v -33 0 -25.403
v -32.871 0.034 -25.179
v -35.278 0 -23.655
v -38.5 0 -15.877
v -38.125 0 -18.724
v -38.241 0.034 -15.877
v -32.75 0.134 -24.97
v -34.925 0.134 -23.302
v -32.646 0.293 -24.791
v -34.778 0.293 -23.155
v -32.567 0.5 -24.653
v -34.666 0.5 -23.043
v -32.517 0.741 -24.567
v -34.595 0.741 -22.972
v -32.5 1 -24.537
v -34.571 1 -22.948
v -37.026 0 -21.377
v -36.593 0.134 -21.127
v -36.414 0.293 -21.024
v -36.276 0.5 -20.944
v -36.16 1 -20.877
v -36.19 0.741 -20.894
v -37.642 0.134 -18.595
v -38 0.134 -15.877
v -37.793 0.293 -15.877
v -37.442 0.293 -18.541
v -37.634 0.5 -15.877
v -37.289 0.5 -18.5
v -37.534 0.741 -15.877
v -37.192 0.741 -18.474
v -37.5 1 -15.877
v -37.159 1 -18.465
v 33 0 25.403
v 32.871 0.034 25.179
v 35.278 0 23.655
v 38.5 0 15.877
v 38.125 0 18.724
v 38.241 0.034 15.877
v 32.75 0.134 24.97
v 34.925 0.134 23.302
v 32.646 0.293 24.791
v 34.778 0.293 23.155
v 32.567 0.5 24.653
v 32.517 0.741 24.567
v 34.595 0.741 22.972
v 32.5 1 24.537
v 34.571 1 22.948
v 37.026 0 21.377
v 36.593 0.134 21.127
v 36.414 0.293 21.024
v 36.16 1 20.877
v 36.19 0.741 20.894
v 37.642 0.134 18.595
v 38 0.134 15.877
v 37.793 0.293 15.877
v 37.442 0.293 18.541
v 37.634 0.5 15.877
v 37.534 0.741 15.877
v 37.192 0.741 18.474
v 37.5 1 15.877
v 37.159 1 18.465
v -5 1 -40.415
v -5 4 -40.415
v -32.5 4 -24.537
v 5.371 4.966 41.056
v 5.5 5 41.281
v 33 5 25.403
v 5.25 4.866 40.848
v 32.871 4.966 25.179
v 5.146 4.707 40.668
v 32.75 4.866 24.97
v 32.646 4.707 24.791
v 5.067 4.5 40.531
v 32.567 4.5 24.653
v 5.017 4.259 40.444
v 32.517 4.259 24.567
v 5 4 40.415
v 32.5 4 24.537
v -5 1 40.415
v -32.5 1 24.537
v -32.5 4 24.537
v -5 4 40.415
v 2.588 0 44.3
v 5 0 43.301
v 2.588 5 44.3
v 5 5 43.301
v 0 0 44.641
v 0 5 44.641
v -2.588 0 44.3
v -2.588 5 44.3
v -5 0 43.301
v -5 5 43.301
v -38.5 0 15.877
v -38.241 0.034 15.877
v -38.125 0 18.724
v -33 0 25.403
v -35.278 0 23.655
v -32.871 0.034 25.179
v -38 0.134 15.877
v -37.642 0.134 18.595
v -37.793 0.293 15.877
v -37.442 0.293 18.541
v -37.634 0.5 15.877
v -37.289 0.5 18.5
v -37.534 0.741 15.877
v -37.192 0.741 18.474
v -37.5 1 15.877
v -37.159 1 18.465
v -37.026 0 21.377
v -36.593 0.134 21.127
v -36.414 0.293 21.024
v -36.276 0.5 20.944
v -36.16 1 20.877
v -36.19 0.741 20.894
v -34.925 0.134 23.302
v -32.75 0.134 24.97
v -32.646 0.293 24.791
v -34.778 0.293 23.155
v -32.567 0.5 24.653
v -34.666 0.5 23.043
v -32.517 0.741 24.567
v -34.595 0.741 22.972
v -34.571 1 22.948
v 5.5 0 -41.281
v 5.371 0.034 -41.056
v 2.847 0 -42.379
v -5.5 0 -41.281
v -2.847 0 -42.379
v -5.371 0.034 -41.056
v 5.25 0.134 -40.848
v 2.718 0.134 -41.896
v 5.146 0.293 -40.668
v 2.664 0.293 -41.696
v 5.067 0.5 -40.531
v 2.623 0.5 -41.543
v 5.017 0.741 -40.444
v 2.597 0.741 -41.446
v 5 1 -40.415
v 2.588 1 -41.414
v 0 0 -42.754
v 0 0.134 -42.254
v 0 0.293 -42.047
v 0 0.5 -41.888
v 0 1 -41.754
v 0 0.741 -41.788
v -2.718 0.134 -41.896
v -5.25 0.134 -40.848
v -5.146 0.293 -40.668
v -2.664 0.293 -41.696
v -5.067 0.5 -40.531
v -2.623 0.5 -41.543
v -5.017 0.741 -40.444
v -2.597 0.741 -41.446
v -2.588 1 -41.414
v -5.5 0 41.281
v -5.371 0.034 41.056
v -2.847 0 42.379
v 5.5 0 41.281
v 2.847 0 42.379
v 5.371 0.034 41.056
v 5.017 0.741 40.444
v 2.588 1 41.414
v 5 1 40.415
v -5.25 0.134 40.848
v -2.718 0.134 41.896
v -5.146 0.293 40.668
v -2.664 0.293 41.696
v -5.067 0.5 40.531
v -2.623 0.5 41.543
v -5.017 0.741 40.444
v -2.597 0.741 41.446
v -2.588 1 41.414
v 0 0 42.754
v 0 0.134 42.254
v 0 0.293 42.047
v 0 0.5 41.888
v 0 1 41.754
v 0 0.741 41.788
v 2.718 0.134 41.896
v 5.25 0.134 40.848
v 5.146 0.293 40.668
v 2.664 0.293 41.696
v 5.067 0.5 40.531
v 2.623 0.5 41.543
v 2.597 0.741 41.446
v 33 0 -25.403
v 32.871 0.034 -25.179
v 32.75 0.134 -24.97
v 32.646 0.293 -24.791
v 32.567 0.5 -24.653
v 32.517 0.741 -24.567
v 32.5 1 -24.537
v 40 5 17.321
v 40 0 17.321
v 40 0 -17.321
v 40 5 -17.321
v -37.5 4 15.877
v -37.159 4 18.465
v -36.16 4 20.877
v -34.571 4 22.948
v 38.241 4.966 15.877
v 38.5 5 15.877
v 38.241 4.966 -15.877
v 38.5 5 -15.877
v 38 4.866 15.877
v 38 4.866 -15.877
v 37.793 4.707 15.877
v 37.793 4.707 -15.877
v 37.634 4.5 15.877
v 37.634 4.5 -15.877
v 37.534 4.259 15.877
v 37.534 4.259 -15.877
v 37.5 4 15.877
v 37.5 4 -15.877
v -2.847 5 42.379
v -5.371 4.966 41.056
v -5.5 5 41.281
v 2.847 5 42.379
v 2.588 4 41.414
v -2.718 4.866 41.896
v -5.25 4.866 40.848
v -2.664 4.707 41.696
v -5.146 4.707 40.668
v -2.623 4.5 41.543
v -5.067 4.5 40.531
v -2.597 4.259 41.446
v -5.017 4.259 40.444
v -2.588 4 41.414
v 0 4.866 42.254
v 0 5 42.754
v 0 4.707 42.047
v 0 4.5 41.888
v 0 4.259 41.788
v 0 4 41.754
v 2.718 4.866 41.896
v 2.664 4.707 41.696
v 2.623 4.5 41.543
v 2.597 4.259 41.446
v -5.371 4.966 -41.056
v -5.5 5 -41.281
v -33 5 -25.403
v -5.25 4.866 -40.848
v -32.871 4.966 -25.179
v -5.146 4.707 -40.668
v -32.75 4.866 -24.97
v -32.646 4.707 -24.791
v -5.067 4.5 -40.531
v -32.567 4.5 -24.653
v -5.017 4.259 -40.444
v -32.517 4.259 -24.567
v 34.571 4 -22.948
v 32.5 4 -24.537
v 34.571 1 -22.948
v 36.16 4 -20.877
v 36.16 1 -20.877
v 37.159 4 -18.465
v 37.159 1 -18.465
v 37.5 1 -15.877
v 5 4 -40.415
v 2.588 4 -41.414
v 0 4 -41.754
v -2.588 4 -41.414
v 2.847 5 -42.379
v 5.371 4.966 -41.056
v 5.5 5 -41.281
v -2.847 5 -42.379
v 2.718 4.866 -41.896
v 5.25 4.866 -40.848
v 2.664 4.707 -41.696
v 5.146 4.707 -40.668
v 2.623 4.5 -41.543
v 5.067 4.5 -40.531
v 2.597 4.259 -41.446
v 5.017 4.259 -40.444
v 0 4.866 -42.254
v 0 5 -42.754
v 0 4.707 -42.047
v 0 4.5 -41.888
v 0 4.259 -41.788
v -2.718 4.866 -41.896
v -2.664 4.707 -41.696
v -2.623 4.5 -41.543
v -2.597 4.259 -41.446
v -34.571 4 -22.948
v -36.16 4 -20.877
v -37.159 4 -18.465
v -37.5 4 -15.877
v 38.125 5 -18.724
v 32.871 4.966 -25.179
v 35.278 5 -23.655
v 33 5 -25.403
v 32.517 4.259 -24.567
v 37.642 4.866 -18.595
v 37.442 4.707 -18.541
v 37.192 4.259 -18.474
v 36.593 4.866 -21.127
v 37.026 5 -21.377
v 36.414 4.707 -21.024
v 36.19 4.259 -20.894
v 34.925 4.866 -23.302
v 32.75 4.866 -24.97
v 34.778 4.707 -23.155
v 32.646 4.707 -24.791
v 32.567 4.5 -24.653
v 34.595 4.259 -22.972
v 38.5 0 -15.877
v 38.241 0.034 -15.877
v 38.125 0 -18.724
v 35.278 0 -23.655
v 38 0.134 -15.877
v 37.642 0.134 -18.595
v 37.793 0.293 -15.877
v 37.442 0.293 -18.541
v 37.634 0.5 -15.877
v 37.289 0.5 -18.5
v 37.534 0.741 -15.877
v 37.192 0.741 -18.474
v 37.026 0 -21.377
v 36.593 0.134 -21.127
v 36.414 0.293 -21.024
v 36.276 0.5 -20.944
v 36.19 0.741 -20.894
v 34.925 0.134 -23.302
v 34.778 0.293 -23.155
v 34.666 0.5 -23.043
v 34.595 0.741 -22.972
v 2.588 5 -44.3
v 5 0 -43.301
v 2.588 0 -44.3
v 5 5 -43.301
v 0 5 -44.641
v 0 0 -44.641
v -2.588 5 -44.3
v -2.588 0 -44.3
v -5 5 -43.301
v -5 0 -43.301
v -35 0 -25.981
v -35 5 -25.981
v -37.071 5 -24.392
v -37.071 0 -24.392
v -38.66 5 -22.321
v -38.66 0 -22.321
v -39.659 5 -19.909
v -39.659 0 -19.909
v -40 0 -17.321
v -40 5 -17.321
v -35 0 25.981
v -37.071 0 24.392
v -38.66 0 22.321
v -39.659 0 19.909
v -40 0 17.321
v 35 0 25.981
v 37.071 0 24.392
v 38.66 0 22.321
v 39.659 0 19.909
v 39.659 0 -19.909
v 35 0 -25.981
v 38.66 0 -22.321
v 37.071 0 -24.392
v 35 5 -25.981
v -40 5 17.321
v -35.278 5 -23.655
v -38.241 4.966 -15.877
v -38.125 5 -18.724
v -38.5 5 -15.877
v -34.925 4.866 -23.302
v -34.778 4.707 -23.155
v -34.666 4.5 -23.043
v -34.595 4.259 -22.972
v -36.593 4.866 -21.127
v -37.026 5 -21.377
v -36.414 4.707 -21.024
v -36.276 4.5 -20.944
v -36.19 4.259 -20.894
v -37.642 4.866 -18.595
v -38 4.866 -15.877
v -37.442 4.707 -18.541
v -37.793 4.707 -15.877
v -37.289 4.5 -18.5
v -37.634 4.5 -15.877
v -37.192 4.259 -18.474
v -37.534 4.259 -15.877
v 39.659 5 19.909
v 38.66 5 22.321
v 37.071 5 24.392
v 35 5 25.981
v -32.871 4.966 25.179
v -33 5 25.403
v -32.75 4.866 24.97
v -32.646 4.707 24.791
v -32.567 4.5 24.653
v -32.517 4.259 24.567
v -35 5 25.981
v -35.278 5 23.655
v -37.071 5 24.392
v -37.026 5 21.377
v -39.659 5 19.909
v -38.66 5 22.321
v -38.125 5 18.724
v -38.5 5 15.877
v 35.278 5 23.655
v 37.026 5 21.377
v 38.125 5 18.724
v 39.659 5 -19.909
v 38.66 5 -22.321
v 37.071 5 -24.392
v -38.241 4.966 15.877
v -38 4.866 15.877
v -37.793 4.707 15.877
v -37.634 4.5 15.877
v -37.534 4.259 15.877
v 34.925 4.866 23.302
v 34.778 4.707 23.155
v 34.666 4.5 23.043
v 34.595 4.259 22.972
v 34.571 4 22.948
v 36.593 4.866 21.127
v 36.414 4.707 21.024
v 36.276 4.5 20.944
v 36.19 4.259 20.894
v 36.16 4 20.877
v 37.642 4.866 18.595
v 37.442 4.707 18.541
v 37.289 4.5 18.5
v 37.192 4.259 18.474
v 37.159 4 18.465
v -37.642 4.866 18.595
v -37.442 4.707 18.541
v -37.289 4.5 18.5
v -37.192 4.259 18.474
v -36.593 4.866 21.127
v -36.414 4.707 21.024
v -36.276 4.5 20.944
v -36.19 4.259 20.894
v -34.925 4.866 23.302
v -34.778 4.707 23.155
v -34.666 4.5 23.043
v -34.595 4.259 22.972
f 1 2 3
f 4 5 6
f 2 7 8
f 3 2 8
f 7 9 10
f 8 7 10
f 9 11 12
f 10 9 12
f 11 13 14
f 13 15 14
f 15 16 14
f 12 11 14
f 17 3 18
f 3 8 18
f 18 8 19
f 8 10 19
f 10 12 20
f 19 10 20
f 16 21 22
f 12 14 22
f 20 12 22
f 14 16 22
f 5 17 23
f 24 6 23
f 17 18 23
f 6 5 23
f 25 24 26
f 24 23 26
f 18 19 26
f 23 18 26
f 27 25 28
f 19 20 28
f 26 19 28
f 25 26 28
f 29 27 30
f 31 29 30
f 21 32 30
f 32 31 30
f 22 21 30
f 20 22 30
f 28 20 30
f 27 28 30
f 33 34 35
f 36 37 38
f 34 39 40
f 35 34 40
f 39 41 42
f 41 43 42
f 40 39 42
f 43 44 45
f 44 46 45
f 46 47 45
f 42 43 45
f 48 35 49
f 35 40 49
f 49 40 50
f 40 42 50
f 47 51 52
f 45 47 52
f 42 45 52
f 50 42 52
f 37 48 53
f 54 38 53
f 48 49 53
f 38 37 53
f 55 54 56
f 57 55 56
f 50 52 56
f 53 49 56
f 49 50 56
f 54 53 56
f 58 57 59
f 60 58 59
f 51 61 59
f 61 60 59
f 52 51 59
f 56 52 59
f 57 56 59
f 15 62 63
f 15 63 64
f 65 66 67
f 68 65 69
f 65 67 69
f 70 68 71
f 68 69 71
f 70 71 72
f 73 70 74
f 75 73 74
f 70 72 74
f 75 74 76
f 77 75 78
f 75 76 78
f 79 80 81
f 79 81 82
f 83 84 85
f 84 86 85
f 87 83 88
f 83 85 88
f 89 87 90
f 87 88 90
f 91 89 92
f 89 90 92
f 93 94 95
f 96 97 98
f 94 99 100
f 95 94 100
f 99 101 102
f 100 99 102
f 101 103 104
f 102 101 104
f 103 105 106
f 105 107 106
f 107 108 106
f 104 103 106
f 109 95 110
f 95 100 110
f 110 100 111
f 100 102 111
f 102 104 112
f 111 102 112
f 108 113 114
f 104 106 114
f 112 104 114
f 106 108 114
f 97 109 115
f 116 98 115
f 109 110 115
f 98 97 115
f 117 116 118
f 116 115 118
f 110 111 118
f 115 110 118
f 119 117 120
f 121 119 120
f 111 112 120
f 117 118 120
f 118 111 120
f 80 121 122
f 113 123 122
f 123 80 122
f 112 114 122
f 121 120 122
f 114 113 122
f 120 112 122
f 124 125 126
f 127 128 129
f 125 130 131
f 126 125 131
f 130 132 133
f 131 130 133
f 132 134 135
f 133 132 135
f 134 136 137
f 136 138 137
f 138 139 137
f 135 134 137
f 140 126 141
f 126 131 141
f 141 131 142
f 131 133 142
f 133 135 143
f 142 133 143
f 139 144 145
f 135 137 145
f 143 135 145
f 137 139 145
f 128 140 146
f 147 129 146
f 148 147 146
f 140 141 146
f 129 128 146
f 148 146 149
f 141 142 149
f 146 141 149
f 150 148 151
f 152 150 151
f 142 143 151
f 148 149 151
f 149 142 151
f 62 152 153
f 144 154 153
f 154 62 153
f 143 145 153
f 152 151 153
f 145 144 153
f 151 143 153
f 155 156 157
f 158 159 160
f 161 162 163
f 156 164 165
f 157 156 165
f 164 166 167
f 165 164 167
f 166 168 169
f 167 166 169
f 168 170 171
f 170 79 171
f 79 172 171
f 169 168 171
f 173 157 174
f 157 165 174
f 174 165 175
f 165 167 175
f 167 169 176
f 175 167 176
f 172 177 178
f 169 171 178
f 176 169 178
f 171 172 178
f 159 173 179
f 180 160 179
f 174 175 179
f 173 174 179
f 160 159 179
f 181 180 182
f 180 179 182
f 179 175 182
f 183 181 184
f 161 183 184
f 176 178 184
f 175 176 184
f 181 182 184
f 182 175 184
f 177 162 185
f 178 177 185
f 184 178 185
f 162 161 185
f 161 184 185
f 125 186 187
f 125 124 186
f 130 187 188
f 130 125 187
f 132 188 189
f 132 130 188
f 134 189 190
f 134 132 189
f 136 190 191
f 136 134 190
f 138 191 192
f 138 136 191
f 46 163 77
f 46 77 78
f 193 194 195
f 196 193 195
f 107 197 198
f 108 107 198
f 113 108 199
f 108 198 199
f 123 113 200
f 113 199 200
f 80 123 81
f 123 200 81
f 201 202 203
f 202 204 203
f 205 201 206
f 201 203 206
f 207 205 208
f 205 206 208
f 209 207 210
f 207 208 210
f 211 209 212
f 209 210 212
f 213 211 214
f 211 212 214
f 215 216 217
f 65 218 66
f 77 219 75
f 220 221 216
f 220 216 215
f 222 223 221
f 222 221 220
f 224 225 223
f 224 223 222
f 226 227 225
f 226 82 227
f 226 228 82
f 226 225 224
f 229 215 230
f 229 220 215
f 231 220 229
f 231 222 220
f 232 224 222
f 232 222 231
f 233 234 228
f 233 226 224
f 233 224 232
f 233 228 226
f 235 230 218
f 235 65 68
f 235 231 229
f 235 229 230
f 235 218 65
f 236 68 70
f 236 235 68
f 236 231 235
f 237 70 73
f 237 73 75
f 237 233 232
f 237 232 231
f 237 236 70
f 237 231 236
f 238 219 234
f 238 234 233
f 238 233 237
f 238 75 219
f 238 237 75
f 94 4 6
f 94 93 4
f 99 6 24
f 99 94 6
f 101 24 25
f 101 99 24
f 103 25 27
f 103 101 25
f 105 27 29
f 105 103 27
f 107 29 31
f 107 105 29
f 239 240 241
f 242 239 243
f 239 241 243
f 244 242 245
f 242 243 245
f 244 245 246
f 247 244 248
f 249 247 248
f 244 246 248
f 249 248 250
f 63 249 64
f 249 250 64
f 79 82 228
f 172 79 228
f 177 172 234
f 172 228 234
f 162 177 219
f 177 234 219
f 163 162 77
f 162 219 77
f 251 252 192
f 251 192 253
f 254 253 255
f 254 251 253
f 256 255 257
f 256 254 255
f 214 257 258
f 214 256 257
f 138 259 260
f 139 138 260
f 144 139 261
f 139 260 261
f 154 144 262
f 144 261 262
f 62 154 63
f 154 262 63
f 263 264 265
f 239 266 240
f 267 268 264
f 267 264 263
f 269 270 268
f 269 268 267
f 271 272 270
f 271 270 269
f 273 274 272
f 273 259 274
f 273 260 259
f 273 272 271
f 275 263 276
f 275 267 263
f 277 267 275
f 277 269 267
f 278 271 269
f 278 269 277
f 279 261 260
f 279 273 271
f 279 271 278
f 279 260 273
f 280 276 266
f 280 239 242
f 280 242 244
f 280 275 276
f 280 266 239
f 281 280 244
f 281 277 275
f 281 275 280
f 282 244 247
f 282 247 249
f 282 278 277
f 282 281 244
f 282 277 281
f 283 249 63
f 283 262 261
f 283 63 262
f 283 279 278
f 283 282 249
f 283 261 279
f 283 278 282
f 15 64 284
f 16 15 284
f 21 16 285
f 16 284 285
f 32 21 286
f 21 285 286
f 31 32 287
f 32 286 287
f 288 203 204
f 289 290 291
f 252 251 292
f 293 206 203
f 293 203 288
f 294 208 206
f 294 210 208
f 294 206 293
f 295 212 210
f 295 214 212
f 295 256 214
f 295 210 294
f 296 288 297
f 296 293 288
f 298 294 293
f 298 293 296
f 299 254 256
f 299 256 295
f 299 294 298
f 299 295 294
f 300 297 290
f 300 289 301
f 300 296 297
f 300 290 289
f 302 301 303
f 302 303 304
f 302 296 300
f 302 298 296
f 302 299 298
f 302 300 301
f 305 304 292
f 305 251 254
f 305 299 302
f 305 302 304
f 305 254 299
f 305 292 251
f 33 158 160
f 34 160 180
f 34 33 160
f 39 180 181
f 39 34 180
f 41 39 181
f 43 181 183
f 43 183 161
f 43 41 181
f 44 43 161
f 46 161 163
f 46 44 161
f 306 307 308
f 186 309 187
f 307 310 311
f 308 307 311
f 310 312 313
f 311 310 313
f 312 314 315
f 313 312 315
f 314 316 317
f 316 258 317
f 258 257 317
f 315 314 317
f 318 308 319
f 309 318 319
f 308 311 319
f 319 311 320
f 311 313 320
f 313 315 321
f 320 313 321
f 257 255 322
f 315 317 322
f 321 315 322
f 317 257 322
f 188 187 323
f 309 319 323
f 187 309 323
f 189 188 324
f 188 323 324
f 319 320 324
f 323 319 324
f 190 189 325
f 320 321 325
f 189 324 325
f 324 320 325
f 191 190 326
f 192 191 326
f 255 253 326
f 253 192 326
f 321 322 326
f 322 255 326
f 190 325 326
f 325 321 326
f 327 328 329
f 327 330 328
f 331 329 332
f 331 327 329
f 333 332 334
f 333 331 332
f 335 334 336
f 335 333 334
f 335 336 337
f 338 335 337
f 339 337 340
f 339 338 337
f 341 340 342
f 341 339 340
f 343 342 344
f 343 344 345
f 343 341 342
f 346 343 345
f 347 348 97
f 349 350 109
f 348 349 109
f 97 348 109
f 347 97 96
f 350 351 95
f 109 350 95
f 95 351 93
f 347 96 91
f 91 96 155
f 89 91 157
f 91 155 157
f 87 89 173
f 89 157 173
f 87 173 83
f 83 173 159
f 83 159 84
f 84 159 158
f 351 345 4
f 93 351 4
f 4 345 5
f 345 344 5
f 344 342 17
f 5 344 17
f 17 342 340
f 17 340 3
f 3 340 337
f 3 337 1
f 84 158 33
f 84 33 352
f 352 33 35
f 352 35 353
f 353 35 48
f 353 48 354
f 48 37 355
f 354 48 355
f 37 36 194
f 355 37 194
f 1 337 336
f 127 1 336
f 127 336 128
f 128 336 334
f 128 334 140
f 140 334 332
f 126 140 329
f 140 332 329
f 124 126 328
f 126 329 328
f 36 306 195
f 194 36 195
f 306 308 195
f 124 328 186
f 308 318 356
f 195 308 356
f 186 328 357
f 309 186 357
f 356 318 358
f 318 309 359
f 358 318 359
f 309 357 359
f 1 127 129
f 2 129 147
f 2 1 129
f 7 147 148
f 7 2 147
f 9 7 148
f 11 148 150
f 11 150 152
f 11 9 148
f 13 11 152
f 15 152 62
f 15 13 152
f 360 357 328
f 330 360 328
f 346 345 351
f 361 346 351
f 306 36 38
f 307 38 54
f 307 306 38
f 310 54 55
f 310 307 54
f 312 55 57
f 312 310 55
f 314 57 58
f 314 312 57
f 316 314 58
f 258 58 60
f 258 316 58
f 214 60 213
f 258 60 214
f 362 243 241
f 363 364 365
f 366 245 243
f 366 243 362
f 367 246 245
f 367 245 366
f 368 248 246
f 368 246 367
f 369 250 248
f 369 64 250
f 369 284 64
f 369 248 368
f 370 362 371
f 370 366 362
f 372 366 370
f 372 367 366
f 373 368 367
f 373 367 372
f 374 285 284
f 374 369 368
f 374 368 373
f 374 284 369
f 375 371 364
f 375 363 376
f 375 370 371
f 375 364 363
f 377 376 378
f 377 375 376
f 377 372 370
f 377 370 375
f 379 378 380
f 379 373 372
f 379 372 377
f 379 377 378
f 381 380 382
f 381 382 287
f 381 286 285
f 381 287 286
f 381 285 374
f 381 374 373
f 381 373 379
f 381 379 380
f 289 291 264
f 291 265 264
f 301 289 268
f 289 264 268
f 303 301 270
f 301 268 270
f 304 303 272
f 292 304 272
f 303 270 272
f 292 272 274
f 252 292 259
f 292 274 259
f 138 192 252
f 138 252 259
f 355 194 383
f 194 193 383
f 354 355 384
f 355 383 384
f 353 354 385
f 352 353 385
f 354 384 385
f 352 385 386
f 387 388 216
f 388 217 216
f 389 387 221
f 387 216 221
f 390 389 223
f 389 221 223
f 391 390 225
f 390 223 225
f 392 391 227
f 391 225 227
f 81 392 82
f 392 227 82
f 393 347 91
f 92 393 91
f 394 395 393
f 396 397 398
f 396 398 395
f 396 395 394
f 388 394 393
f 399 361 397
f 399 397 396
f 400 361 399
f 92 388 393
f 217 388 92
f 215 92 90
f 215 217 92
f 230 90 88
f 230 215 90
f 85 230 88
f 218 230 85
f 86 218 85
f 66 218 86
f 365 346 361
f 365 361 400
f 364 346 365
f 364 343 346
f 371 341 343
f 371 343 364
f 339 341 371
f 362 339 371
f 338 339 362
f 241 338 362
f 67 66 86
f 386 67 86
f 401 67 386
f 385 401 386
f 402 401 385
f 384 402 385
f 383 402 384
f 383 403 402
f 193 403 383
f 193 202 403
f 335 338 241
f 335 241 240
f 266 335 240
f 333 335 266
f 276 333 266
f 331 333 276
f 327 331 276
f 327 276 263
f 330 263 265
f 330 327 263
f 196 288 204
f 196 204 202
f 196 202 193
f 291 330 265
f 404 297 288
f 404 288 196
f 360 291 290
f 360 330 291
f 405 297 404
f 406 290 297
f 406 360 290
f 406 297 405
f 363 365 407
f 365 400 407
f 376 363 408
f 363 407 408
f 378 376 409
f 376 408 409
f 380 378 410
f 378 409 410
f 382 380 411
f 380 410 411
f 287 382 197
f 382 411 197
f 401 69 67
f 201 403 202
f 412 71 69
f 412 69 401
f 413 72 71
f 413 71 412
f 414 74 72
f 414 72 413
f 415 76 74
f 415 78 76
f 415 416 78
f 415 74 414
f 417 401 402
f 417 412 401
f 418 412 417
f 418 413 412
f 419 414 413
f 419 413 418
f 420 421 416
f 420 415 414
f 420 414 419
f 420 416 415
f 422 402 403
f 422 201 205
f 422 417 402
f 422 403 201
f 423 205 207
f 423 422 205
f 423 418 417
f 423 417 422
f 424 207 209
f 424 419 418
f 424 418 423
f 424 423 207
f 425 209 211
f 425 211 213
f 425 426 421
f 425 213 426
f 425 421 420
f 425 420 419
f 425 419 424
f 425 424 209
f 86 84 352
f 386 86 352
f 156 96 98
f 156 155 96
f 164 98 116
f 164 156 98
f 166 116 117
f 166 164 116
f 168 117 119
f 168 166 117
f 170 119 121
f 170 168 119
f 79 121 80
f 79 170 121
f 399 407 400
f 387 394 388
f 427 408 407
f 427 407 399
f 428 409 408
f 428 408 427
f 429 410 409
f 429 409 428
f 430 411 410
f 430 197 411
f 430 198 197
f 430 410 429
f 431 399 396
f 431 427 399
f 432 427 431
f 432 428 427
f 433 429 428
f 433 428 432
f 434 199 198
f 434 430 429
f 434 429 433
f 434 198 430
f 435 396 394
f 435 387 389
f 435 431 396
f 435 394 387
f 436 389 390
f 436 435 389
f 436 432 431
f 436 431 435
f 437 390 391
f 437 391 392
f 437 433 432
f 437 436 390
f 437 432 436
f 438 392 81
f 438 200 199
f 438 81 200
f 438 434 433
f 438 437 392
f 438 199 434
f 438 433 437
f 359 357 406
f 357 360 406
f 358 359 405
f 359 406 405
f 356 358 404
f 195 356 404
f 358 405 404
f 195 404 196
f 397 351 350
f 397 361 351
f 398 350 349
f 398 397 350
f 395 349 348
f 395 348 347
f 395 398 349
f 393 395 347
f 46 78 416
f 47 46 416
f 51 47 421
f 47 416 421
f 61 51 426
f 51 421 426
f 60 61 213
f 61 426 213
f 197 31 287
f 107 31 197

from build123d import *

# Parameters (mm, degrees)
ESTRUSIONE_SOTTILE1_DEPTH = 5
RACCORDO1_R               = 10
RACCORDO2_R               = 1


with BuildPart() as part:
    # Schizzo2 → Estrusione-Sottile1 (new body)
    with BuildSketch(Plane(origin=(0, 0, 0), x_dir=(1, 0, 0), z_dir=(0, 1, 0))):
        Polygon((40, 23.094010768), (0, 46.188021535), (-40, 23.094010768), (-40, -23.094010768), (0, -46.188021535), (40, -23.094010768), align=None)
        Polygon((37.5, 21.650635095), (0, 43.301270189), (-37.5, 21.650635095), (-37.5, -21.650635095), (0, -43.301270189), (37.5, -21.650635095), align=None, mode=Mode.SUBTRACT)
    extrude(amount=ESTRUSIONE_SOTTILE1_DEPTH)

    # Raccordo1
    raccordo1_edges = [part.edges().sort_by_distance(p)[0] for p in [
        (37.5, 2.5, 21.650635095),
        (37.5, 2.5, -21.650635095),
        (0, 2.5, -43.301270189),
        (-37.5, 2.5, -21.650635095),
        (-37.5, 2.5, 21.650635095),
        (0, 2.5, 43.301270189),
        (40, 2.5, 23.094010768),
        (0, 2.5, 46.188021535),
        (-40, 2.5, 23.094010768),
        (-40, 2.5, -23.094010768),
        (0, 2.5, -46.188021535),
        (40, 2.5, -23.094010768),
    ]]
    fillet(raccordo1_edges, radius=RACCORDO1_R)

    # Raccordo2
    raccordo2_edges = [part.edges().sort_by_distance(p)[0] for p in [
        (37.5, 0, 0),
        (18.75, 0, -32.475952642),
        (-18.75, 0, -32.475952642),
        (-37.5, 0, 0),
        (-18.75, 0, 32.475952642),
        (18.75, 0, 32.475952642),
        (18.75, 5, -32.475952642),
        (37.5, 5, 0),
        (18.75, 5, 32.475952642),
        (-18.75, 5, 32.475952642),
        (-37.5, 5, 0),
        (-18.75, 5, -32.475952642),
        (36.160254038, 0, 20.877132403),
        (36.160254038, 5, 20.877132403),
        (0, 0, 41.754264805),
        (0, 5, 41.754264805),
        (36.160254038, 0, -20.877132403),
        (36.160254038, 5, -20.877132403),
        (0, 0, -41.754264805),
        (0, 5, -41.754264805),
        (-36.160254038, 0, -20.877132403),
        (-36.160254038, 5, -20.877132403),
        (-36.160254038, 0, 20.877132403),
        (-36.160254038, 5, 20.877132403),
    ]]
    fillet(raccordo2_edges, radius=RACCORDO2_R)


solid = part.part
